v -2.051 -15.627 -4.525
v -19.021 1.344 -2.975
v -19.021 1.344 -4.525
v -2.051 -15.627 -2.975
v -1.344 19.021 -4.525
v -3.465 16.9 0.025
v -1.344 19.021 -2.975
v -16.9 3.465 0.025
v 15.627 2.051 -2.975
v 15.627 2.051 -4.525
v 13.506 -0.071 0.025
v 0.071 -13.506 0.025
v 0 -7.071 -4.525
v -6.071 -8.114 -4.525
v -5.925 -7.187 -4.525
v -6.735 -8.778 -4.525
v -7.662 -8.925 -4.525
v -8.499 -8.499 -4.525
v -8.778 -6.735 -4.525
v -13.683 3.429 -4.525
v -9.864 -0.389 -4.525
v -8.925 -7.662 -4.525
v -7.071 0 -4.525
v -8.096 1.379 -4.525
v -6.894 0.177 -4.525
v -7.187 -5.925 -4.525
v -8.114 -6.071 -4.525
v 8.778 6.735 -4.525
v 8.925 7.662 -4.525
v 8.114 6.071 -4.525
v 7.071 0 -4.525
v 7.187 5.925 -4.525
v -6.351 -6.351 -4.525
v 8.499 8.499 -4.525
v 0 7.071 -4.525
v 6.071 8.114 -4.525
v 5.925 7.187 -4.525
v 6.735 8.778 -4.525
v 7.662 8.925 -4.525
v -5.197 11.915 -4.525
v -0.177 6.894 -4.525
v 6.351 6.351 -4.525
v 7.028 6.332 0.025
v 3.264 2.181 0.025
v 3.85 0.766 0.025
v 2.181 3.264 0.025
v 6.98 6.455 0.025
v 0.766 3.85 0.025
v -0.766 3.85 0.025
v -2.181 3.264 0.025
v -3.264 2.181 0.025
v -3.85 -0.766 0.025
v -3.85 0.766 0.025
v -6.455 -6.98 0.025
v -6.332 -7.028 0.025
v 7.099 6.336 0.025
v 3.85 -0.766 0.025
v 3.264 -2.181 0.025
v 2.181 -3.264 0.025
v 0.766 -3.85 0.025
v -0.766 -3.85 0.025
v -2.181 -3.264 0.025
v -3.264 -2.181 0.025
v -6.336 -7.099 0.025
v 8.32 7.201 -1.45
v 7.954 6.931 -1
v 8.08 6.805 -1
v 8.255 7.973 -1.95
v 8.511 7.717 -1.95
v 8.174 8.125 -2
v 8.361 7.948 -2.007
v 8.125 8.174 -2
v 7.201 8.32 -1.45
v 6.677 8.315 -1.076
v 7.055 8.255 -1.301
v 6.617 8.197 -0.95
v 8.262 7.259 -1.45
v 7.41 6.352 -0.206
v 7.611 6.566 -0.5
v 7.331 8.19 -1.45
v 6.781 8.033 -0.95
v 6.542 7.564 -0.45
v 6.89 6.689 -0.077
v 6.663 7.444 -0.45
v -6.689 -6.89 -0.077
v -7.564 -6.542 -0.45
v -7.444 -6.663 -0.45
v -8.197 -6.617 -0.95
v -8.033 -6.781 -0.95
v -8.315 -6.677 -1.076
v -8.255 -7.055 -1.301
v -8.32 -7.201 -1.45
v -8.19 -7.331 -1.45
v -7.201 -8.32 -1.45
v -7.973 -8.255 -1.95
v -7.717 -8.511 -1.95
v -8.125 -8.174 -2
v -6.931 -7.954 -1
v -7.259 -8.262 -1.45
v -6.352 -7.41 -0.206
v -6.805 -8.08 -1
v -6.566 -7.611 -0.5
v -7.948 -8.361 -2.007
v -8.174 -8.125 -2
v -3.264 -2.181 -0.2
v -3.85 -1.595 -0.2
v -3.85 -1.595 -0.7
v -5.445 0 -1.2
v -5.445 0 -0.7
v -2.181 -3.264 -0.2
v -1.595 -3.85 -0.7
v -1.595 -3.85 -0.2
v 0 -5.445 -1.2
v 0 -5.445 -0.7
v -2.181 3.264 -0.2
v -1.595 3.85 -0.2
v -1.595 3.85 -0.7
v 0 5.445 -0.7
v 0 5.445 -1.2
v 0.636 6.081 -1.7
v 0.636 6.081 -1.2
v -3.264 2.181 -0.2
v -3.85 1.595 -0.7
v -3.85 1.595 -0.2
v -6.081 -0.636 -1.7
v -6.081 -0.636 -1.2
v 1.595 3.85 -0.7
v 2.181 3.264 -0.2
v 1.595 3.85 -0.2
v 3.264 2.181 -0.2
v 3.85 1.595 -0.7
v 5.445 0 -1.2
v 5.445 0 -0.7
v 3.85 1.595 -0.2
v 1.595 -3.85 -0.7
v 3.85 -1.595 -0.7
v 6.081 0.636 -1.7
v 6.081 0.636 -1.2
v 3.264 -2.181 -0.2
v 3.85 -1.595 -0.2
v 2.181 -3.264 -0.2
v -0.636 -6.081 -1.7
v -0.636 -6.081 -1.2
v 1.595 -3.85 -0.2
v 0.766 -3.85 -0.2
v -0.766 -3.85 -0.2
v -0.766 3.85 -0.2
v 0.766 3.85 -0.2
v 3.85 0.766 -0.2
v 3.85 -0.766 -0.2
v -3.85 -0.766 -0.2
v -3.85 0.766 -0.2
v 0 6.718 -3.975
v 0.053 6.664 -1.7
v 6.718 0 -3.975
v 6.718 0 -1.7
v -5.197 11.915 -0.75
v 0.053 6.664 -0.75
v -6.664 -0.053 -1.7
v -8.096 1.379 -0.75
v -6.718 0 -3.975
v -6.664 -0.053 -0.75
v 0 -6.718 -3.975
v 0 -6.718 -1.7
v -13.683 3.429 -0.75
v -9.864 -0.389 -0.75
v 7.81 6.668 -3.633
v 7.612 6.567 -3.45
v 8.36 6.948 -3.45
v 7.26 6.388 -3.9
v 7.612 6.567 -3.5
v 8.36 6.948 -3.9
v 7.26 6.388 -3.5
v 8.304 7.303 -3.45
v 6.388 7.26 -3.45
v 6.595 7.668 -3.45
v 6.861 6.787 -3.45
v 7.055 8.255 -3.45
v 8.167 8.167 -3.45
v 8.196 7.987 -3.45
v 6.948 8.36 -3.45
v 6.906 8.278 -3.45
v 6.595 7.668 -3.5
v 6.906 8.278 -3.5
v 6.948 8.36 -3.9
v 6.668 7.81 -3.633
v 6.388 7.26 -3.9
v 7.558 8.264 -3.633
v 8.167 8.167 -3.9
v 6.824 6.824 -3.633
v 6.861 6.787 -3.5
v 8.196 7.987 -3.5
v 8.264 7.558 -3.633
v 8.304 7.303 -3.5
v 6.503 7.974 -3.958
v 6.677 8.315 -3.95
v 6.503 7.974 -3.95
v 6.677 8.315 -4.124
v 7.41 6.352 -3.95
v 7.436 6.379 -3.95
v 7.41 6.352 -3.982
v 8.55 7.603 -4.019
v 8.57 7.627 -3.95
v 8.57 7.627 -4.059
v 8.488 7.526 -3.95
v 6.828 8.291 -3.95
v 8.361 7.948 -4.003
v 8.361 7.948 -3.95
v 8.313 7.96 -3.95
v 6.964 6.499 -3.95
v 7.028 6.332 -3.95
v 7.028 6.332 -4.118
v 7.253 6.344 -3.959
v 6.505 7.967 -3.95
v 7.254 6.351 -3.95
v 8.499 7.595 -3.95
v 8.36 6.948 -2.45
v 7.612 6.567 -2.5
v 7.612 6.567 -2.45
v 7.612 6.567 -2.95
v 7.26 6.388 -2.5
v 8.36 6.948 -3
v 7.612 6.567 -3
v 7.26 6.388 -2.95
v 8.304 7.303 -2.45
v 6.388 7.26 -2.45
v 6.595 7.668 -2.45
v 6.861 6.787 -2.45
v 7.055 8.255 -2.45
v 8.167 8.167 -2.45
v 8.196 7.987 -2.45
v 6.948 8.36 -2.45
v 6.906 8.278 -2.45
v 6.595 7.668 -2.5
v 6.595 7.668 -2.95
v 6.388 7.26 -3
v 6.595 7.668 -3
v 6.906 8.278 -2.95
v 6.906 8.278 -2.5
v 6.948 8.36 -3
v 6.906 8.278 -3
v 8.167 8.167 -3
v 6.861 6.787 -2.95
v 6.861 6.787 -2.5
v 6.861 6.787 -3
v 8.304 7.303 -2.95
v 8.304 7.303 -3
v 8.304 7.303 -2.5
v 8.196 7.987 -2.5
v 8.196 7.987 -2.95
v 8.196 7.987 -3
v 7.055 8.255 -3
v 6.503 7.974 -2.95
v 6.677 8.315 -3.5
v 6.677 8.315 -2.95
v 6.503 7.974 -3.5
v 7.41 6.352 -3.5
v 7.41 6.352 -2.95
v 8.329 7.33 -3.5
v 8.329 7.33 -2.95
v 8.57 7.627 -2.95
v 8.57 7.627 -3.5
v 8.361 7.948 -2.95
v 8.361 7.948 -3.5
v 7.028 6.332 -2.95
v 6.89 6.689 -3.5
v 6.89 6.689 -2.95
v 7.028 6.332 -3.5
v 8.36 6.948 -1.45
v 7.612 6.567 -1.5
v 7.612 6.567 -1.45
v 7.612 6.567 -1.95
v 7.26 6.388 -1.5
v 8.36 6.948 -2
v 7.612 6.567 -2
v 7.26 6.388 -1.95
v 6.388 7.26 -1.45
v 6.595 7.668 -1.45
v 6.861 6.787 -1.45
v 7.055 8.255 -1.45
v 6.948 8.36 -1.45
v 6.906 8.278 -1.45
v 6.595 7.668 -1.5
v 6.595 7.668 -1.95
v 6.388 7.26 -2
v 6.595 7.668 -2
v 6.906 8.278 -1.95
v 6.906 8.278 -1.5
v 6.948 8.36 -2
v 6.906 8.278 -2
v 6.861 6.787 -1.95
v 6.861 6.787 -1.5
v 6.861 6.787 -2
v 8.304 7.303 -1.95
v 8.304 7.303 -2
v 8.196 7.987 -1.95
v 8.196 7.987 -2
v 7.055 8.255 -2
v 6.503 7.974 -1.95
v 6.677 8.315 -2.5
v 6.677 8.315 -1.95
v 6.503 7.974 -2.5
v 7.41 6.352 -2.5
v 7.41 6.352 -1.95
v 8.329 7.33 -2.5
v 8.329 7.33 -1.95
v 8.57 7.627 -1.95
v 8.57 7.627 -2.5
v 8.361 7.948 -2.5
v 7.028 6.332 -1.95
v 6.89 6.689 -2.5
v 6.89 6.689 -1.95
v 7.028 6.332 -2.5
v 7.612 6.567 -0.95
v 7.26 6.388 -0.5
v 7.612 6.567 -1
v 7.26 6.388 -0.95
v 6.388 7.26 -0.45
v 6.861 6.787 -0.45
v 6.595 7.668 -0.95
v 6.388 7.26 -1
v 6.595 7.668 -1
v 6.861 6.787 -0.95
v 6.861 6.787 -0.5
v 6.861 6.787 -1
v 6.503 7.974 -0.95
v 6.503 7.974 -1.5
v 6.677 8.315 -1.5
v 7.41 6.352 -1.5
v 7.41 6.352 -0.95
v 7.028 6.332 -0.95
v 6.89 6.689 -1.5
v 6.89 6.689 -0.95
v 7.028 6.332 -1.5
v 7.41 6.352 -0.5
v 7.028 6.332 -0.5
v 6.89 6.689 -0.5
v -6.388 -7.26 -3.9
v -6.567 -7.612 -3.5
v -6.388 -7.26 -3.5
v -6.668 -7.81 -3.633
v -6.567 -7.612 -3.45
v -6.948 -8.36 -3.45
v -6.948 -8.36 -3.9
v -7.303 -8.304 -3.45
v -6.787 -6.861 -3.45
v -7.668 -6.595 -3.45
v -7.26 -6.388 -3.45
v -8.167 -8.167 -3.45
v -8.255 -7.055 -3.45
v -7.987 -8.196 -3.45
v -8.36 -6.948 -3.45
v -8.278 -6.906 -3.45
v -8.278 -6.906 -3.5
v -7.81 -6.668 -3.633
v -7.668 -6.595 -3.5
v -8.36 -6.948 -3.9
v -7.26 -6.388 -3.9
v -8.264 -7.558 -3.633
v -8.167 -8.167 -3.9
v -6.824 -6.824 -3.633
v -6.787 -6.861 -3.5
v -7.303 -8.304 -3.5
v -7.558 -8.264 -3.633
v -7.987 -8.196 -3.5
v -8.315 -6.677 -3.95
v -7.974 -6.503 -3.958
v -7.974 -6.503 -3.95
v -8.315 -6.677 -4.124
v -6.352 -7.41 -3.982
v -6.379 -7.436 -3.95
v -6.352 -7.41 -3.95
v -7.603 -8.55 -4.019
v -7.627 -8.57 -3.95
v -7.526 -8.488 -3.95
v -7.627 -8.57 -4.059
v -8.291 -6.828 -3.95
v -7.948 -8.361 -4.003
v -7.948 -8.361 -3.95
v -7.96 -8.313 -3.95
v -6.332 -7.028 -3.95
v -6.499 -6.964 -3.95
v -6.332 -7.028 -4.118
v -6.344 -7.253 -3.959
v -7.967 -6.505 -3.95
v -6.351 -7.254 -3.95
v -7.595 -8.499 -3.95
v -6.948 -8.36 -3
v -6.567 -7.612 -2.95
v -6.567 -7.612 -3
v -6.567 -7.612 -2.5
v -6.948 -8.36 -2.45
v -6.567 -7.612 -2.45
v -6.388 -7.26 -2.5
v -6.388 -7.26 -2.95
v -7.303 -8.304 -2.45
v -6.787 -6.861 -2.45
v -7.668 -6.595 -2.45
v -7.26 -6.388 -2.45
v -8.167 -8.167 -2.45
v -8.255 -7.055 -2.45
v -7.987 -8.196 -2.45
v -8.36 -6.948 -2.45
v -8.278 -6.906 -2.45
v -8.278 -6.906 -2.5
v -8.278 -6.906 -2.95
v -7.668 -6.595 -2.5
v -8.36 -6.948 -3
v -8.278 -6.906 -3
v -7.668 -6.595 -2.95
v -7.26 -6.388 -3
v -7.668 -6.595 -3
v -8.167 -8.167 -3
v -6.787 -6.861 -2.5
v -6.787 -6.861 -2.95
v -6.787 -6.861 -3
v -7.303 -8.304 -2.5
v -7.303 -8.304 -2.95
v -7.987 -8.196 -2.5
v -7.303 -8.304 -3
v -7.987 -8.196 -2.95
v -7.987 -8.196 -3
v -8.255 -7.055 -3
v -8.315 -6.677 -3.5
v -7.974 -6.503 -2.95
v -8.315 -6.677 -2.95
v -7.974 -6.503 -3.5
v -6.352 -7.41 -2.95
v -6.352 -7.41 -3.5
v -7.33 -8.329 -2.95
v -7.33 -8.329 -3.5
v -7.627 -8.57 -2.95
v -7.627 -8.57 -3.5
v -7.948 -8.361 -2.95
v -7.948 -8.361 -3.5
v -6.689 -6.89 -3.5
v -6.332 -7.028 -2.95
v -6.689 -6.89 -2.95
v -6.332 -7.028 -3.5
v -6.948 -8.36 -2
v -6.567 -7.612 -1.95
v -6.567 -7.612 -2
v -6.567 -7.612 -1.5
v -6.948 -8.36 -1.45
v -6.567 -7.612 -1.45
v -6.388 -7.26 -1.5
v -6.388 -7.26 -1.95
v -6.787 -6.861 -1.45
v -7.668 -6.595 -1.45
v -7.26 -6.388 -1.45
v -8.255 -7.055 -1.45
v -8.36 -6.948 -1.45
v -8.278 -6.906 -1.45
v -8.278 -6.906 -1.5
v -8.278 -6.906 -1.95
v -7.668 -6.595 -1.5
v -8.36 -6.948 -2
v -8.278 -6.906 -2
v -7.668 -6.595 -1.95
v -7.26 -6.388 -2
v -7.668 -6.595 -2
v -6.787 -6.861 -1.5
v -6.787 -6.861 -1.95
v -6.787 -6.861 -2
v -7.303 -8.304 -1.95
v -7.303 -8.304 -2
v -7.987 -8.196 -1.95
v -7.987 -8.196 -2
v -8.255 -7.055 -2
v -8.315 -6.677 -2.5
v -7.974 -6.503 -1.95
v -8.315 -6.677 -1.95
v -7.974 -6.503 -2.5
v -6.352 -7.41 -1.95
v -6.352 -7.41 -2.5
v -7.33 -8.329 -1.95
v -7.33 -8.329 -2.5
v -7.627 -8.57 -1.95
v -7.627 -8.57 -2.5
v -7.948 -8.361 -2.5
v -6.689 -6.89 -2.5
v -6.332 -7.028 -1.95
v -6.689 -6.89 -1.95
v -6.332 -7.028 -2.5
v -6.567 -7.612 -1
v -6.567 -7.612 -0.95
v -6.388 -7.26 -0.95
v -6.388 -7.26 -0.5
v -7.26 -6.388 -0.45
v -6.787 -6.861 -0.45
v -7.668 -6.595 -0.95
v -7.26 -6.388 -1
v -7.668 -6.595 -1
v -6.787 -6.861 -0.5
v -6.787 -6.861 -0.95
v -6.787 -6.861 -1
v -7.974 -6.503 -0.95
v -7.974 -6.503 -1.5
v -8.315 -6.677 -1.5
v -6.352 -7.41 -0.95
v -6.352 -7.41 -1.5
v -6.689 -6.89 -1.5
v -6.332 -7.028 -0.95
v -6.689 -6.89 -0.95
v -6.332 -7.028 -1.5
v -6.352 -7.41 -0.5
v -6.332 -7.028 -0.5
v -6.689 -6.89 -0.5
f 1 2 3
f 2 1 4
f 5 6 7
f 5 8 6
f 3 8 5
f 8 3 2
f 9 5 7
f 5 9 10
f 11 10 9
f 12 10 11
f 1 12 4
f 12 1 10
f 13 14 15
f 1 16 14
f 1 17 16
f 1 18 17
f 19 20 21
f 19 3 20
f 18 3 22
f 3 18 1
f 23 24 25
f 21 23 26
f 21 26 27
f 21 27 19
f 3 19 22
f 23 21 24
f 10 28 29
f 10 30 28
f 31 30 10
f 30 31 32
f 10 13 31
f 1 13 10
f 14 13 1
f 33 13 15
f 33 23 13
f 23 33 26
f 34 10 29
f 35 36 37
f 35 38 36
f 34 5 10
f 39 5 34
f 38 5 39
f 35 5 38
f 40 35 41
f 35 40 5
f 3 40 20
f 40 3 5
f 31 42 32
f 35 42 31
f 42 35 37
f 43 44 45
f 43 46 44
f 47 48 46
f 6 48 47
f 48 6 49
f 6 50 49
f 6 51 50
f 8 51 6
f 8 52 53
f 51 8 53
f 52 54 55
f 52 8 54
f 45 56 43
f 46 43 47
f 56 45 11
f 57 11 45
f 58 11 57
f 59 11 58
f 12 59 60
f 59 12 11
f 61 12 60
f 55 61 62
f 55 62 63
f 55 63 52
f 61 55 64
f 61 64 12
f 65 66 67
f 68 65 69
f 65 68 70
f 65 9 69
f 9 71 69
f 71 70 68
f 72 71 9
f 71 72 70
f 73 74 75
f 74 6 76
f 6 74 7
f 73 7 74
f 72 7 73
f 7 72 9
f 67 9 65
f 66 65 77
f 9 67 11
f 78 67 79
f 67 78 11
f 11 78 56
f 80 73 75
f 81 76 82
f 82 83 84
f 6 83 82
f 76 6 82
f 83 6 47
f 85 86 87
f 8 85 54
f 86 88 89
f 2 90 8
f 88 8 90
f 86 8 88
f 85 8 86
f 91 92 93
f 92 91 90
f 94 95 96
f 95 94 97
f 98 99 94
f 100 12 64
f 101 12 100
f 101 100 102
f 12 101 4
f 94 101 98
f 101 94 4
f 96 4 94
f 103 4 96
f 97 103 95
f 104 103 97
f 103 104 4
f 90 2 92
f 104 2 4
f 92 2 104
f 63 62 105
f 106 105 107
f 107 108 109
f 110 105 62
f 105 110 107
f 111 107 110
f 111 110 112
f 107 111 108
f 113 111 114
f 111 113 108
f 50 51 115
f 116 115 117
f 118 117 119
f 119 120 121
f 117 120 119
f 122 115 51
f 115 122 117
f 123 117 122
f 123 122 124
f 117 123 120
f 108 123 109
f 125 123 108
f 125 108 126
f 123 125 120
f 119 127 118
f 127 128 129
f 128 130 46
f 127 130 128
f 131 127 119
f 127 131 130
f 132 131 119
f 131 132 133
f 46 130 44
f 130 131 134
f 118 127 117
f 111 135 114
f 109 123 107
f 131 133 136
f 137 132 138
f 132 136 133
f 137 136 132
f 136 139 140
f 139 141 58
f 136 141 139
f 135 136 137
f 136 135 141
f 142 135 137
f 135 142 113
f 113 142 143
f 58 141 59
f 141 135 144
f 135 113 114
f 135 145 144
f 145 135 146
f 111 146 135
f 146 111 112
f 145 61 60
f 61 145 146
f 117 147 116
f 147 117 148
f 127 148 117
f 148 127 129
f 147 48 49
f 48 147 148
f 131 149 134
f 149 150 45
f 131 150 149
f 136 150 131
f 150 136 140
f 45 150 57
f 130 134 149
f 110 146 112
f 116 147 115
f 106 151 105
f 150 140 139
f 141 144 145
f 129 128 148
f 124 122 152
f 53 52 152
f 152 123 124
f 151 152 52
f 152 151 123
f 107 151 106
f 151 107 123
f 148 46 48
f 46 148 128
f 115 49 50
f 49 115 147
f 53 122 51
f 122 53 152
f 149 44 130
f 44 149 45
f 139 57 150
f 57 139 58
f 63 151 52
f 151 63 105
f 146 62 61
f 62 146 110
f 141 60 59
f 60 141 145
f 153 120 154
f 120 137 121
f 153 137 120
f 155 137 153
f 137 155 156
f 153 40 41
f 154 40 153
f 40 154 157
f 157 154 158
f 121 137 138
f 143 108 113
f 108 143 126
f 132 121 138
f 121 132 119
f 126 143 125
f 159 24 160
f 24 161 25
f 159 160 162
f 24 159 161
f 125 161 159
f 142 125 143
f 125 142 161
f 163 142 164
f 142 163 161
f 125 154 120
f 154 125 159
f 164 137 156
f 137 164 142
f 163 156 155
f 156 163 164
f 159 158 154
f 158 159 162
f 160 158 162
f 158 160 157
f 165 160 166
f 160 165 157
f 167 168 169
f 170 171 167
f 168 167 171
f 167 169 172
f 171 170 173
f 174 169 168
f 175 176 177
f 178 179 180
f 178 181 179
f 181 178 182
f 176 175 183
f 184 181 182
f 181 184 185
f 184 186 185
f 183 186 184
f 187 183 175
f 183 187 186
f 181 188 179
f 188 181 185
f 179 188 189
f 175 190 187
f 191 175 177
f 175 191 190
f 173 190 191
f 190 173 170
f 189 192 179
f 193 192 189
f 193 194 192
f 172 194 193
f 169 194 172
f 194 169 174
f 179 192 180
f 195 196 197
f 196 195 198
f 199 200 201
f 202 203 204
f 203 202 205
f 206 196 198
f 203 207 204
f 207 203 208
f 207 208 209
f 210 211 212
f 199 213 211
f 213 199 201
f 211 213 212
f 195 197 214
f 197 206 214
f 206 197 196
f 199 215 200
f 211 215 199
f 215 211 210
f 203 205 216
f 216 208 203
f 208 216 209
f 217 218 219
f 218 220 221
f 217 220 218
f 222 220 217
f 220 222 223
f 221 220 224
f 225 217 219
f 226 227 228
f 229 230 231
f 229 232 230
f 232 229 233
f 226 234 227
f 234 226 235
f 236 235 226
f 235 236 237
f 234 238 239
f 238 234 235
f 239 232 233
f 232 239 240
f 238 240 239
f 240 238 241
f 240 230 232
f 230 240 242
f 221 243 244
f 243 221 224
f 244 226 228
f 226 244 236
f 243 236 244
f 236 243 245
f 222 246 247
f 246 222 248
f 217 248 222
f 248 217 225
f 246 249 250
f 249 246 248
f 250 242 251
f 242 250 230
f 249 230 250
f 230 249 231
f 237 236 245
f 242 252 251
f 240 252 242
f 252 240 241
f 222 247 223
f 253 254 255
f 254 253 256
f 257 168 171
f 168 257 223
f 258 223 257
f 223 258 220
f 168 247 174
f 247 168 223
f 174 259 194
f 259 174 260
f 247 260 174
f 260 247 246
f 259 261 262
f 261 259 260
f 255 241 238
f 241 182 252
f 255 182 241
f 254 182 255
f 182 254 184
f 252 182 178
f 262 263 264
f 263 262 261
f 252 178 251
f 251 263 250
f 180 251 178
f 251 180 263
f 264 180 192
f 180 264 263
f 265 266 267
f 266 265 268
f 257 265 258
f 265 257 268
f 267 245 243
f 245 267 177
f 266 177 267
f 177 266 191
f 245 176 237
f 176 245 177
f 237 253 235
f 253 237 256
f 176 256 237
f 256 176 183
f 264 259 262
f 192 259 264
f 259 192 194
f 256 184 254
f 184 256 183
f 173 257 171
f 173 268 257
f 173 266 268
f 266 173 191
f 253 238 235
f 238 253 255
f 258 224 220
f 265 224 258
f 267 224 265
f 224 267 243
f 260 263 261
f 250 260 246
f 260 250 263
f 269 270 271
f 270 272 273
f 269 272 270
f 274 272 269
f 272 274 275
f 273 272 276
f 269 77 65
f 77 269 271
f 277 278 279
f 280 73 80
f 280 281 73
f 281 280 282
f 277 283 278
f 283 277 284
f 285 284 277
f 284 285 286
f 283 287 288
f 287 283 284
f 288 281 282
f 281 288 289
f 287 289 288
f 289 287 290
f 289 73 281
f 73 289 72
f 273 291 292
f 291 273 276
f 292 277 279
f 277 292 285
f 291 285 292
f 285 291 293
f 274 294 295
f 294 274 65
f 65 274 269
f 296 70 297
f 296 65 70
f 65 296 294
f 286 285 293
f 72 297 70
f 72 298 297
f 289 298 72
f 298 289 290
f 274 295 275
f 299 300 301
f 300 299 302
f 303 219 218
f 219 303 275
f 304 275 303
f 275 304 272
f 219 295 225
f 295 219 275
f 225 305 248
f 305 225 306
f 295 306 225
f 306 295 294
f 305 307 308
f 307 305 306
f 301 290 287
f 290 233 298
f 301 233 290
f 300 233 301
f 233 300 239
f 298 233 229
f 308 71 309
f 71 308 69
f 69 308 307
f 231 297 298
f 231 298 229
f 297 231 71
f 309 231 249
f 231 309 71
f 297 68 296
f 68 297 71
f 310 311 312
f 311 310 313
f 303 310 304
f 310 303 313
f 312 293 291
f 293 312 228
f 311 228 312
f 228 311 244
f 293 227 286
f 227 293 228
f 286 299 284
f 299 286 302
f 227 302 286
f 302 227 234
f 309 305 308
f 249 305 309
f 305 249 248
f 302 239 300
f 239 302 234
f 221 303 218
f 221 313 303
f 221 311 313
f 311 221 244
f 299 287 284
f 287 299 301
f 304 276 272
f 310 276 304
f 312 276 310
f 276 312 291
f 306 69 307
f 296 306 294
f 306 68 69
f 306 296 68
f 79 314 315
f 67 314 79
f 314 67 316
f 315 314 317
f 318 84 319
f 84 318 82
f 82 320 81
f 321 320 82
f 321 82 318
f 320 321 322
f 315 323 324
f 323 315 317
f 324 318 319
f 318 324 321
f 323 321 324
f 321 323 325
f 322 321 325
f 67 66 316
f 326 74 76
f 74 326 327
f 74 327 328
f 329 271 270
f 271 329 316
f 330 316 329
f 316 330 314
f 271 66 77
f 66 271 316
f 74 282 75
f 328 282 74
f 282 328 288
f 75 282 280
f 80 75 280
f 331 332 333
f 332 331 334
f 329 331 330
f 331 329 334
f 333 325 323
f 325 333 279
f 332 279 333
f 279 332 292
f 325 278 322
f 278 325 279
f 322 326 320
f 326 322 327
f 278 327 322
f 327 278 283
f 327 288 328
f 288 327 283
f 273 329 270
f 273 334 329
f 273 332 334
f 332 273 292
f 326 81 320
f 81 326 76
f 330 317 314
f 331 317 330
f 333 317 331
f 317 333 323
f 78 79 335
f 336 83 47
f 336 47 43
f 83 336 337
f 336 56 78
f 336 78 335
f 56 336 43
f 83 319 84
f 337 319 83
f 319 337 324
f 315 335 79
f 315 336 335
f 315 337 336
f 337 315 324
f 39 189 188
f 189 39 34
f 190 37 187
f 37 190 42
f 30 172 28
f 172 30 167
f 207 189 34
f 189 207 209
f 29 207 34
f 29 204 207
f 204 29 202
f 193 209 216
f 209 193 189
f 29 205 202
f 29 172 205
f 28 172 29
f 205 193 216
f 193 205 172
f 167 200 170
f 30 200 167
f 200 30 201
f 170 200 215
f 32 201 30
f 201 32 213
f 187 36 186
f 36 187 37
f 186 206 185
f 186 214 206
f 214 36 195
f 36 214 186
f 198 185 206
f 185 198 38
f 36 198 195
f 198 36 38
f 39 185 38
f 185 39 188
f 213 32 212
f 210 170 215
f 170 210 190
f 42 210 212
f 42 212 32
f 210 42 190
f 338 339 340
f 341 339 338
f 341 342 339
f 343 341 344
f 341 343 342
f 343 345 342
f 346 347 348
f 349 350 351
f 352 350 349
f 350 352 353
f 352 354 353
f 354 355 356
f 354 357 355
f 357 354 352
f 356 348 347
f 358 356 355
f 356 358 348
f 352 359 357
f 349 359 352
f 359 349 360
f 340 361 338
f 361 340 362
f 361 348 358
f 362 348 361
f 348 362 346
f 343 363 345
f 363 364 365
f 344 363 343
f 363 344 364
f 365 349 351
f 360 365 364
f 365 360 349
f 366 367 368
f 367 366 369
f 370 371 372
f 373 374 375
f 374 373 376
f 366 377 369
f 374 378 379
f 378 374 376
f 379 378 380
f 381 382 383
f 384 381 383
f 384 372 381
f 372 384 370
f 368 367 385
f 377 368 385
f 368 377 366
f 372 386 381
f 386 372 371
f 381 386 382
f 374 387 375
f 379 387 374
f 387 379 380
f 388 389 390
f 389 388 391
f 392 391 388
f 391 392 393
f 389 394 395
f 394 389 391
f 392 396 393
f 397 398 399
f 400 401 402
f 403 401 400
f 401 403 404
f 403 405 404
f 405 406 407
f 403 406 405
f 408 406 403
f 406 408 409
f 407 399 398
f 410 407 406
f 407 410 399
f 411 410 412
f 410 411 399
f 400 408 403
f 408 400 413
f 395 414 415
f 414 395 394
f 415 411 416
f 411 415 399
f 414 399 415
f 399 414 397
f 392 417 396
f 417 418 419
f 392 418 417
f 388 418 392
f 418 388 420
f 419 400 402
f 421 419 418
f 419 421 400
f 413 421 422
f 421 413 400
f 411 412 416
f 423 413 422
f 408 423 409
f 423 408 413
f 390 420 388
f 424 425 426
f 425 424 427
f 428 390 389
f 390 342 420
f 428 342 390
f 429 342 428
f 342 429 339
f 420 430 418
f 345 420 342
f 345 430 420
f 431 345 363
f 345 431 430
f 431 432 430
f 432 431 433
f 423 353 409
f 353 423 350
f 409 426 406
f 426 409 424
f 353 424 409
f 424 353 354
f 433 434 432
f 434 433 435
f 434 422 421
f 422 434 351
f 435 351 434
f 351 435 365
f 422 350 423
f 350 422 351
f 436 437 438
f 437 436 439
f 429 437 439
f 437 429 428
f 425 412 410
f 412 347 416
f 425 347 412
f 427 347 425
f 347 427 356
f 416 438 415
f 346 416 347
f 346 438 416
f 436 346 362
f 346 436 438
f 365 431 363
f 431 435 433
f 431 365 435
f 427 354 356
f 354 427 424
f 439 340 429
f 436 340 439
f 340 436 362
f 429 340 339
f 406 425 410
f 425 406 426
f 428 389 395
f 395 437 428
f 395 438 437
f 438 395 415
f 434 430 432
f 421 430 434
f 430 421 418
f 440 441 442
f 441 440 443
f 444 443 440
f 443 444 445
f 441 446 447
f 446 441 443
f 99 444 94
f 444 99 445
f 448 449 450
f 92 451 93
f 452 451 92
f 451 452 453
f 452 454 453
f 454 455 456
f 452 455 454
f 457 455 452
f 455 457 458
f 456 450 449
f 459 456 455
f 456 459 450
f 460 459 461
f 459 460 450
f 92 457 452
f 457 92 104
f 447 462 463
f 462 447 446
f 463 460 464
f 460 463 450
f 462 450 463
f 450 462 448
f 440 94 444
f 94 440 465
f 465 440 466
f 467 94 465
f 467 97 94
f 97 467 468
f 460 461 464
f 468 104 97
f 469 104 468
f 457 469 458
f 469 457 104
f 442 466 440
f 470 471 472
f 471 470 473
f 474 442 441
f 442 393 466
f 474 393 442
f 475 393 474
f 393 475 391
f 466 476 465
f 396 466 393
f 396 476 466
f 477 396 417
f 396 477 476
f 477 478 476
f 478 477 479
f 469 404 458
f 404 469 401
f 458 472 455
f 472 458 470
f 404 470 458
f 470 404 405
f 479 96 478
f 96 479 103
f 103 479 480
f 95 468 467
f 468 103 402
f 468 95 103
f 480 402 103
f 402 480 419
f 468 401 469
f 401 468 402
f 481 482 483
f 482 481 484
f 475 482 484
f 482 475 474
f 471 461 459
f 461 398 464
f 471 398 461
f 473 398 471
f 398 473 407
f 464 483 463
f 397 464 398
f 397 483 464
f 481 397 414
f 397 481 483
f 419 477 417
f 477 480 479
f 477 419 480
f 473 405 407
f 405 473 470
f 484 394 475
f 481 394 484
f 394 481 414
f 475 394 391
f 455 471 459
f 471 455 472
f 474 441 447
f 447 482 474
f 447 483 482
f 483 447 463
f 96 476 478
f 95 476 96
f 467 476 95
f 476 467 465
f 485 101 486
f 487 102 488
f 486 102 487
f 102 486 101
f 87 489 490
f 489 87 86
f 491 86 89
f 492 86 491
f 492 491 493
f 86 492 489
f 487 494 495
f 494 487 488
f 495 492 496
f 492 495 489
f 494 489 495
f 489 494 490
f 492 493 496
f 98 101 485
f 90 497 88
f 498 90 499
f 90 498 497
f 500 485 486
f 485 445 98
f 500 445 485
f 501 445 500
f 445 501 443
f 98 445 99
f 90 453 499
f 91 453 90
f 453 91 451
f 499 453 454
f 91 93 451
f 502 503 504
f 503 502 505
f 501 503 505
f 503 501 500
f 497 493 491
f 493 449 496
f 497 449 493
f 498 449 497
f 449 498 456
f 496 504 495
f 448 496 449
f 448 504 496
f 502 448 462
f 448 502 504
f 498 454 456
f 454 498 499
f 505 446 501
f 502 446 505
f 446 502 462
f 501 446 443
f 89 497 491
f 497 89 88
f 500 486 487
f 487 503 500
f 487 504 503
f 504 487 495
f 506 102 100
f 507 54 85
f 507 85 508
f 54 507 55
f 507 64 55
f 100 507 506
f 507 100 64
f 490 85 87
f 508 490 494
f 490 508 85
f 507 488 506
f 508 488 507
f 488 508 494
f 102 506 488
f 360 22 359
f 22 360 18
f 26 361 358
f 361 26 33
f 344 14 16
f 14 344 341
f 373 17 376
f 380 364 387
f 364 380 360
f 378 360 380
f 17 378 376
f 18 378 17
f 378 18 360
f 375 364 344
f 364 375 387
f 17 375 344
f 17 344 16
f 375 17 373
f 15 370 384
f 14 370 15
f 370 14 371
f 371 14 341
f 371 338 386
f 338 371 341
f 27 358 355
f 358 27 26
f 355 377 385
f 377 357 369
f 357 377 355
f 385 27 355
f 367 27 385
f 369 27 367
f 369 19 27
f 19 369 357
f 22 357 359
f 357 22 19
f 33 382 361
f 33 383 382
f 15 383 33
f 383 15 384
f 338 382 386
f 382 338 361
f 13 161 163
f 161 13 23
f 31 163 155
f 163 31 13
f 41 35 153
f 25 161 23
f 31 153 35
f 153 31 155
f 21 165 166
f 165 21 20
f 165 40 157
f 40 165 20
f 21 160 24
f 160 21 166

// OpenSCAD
/******************************************************************
*                                                                 *
* OpenFlexure Microscope: Raspberry Pi Camera v2 push-fit mount   *
*                                                                 *
* This is part of the OpenFlexure microscope, an open-source      *
* microscope and 3-axis translation stage.  It gets really good   *
* precision over a ~10mm range, by using plastic flexure          *
* mechanisms.                                                     *
*                                                                 *
* This file provides two parts for the microscope; the bit that   *
* fits onto the camera (picam2_camera_mount) and a cover that     *
* protects the PCB (picam_cover).  The former is part of the      *
* optics module in optics.scad, and the latter is printed         *
* directly.                                                       *
*                                                                 *
* The fit is set by one main function, picam2_push_fit().  It's   *
* designed to be subtracted from a solid block, with the bottom   *
* of the block at z=0.  It grips the plastic camera housing with  *
* four slightly flexible fingers, which ensures the camera pops   *
* in easily but is held relatively firmly.  Two screw holes are   *
* also provided that should self-tap with M2 or similar screws.   *
* I recommend you use these for extra security if the camera is   *
* likely to be handled a lot.                                     *
*                                                                 *
* (c) Richard Bowman, January 2016                                *
* Released under the CERN Open Hardware License                   *
*                                                                 *
******************************************************************/


use <../utilities.scad>;

d=0.05; //small distance!

function camera_mount_height() = 4.5;
bottom = camera_mount_height() * -1;

module picam2_cutout( beam_length=15){
    // This module is designed to be subtracted from the bottom of a shape.
    // The z=0 plane should be the print bed.
    // It includes cut-outs for the components on the PCB and also a push-fit hole
    // for the camera module.  This uses flexible "fingers" to grip the camera firmly
    // but gently.  Just push to insert, and wiggle to remove.  You may find popping 
    // off the brown ribbon cable and removing the PCB first helps when extracting
    // the camera module again.
    cw = 8.5 + 1.0; //size of camera box sides (NB deliberately loose fitting)
    ch=2.8; //height of camera box
    camera = [cw,cw,ch]; //size of camera box (NB it's now propped up on foam)
    hole_r = cw/2-0.9;
	union(){
		//cut-out for camera
        hull(){
            translate([0,0,-d]) cube([cw+0.5,cw+0.5,d],center=true); //hole for camera
            translate([0,0,0.5]) cube([cw,cw,d],center=true);
        }
        intersection(){
            cube([cw,cw,999],center=true);
            translate([0,0,ch]) 
                    hole_from_bottom(r=hole_r,h=beam_length, base_w=cw);
        }
        
        
        
		//ribbon cable at top of camera
        fh=camera_mount_height() - 0.75;
        sequential_hull(){
            translate([0,cw/2-d,0]) cube([cw,d,2*fh],center=true);
            translate([0,cw/2+1,0]) cube([cw,d,2*fh],center=true);
            translate([0,9.4-(4.4/1)/2,0]) cube([cw,1,2*fh],center=true);
        }
        //flex connector
        translate([-1.25,9.4,0]) cube([cw+2.5, 4.4+1, 2*fh],center=true);
        
        //chamfered screw holes for mounting
        sx = 21/2; //position of screw holes
        reflect([1,0,0]) translate([sx,0,0]){
            cylinder(r1=3, r2=0,h=4, center=true); //chamfered bottom
            deformable_hole_trylinder(1.5/2,2.1/2,h=12, center=true);
        }
	}
}

module picam2_pcb_bottom(){
    // This is an approximate model of the pi camera PCB for the purposes of making
    // a slide-on cover.  NB z=0 is the bottom of the PCB, which is nominally 1mm thick.
    pcb = [25+0.5,24+0.5,1+0.3];
    socket = [pcb[0],6.0+0.5,2.7];
    components = [pcb[0]-1*2, pcb[1]-1-socket[1], 2];
    translate([0,2.4,0]) union(){ //NB the camera bit isn't centred!
        translate([0,0,pcb[2]/2]) cube(pcb,center=true); //the PCB
        translate([-components[0]/2,-pcb[1]/2+socket[1],-components[2]+d]) cube(components); //the little components
        //the ribbon cable socket
        translate([-socket[0]/2,-pcb[1]/2,-socket[2]+d]) cube(socket); //the ribbon cable socket
        translate([-components[0]/2,-pcb[1]/2,-0.5]) cube([components[0],socket[1]+0.5,0.5+d]); //pins protrude slightly further
        
        //mounting screws (NB could be extruded in -y so the cover can slide on)
        reflect([1,0,0]) mirror([0,0,1]) translate([21/2,-2.4,-d]){
            cylinder(r=2.5,h=10);
            cylinder(r=1.5,h=15,center=true); //screw might poke through the top...
        }
    }
}
//translate([0,0,-1]) picam_pcb_bottom();

module camera_mount(){
    // A mount for the pi camera v2
    // This should finish at z=0+d, with a surface that can be
    // hull-ed onto the lens assembly.
    b = 24;
    w = 25;
    rotate(45) difference(){
        translate([0,2.4,0]) sequential_hull(){
            translate([0,0,bottom]) cube([w,b,d],center=true);
            translate([0,0,bottom+1.5]) cube([w,b,d],center=true);
            translate([0,0,0]) cube([w-(-1.5-bottom)*2,b,d],center=true);
        }
        translate([0,0,bottom]) picam2_cutout();
    }
}
camera_mount();

/////////// Cover for camera board //////////////
module picam_cover(){
    // A cover for the camera PCB, slips over the bottom of the camera
    // mount.  This version should be compatible with v1 and v2 of the board
    start_y=-12+2.4;//-3.25;
    l=-start_y+12+2.4; //we start just after the socket and finish at 
    //the end of the board - this is that distance!
    difference(){
        union(){
            //base
            translate([-15,start_y,-4.3]) cube([25+5,l,4.3+d]);
            //grippers
            reflect([1,0,0]) translate([-15,start_y,0]){
                cube([2,l,4.5-d]);
                hull(){
                    translate([0,0,1.5]) cube([2,l,3]);
                    translate([0,0,4]) cube([2+2.5,l,0.5]);
                }
            }
        }
        translate([0,0,-1]) picam2_pcb_bottom();
        //chamfer the connector edge for ease of access
        translate([-999,start_y,0]) rotate([-135,0,0]) cube([9999,999,999]);
    }
} 
